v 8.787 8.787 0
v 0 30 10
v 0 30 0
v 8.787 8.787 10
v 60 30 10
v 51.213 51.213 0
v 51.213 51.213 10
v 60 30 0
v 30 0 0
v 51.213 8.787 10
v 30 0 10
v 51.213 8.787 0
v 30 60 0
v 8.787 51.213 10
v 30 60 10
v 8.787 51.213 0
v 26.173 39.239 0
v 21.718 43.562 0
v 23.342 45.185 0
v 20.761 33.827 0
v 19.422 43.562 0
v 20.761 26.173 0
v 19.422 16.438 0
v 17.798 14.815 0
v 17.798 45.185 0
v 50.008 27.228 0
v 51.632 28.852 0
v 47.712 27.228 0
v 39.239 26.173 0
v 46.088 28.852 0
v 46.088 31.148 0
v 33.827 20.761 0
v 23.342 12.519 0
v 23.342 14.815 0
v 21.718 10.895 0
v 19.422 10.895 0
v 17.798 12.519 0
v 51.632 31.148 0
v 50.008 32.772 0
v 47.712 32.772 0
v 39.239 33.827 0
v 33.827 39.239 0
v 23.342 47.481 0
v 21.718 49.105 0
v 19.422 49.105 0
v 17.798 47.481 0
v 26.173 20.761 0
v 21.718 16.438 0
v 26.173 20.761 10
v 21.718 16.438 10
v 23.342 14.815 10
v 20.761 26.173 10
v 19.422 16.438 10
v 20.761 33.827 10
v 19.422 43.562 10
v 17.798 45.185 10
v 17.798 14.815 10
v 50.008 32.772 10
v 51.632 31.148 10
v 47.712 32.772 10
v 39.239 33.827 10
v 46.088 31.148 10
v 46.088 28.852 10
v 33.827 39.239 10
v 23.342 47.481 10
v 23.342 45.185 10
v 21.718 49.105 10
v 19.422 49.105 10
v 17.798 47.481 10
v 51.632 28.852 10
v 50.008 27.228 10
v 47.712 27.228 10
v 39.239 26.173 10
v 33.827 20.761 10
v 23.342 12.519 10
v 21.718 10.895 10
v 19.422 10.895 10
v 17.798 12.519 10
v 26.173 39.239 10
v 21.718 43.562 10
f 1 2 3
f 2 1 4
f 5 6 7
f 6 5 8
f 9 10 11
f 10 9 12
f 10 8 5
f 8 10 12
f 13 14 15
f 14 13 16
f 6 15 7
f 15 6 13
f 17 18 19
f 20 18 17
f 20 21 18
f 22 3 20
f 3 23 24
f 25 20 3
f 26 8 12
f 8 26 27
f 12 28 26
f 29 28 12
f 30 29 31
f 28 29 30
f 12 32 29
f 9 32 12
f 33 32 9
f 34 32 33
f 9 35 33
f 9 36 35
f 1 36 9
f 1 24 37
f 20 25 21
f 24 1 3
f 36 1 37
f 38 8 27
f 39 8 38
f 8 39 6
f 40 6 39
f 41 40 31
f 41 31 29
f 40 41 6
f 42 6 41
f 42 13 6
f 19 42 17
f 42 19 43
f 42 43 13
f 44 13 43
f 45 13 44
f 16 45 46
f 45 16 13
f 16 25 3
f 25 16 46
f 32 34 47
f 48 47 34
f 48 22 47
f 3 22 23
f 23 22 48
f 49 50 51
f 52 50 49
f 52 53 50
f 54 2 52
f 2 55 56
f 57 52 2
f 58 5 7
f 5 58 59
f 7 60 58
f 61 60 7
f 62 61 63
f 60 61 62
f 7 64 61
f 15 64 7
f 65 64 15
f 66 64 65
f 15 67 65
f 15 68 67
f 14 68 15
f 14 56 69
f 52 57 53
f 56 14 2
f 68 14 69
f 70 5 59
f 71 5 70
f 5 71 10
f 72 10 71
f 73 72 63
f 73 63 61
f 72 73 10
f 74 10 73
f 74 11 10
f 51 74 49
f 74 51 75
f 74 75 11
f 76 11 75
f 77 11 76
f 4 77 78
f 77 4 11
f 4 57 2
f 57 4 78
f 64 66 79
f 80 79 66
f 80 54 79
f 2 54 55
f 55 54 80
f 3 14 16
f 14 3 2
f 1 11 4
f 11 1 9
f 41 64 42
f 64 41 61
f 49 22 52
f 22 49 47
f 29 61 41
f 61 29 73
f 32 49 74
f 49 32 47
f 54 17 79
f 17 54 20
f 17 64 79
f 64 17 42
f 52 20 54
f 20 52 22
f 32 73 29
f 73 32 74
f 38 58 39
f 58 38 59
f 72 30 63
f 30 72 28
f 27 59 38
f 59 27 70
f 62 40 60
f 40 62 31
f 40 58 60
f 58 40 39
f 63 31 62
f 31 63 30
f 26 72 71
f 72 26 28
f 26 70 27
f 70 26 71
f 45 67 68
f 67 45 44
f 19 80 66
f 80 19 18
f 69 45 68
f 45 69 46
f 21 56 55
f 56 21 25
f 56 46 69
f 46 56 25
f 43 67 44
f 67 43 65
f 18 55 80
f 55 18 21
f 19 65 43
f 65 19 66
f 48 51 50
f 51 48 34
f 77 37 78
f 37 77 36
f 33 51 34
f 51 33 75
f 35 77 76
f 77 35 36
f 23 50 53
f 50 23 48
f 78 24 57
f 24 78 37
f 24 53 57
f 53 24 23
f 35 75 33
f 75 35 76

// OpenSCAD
$fn = 32;

// ----------------------------------------------------------------------
// Polygon plate: 8-gon R30, 3 bolt windows
// ----------------------------------------------------------------------

// --- parameters (mm) ---
sides = 8;                // number of polygon sides
plate_r = 30;             // circumscribed radius of the polygon
bore_r = 10;              // centre bore radius
bolts = 3;                // number of bolt windows
ring_r = 18.86;           // bolt-circle radius
bolt_r = 3;               // bolt window radius
plate_t = 10;             // plate thickness, Z (extrusion height)

plate_d = 2 * plate_r;  // circumscribed diameter
bore_d = 2 * bore_r;  // centre bore diameter
bolt_d = 2 * bolt_r;  // bolt window diameter
ring_d = 2 * ring_r;  // bolt-circle diameter

profile = [[60, 30], [51.213, 51.213], [30, 60], [8.787, 51.213], [0, 30], [8.787, 8.787], [30, 0], [51.213, 8.787]];  // primary outline, 8 points, counter clockwise
void_1 = [[39.239, 33.827], [33.827, 39.239], [26.173, 39.239], [20.761, 33.827], [20.761, 26.173], [26.173, 20.761], [33.827, 20.761], [39.239, 26.173]];  // centre bore, 8 points
void_2 = [[51.632, 31.148], [50.008, 32.772], [47.712, 32.772], [46.088, 31.148], [46.088, 28.852], [47.712, 27.228], [50.008, 27.228], [51.632, 28.852]];  // bolt window 1, 8 points
void_3 = [[23.342, 47.481], [21.718, 49.105], [19.422, 49.105], [17.798, 47.481], [17.798, 45.185], [19.422, 43.562], [21.718, 43.562], [23.342, 45.185]];  // bolt window 2, 8 points
void_4 = [[23.342, 14.815], [21.718, 16.438], [19.422, 16.438], [17.798, 14.815], [17.798, 12.519], [19.422, 10.895], [21.718, 10.895], [23.342, 12.519]];  // bolt window 3, 8 points

// --- the one profile operation ---
difference() {
  linear_extrude(height = plate_t) polygon(points = profile);
  translate([0, 0, -1])
    linear_extrude(height = plate_t + 2) polygon(points = void_1);
  translate([0, 0, -1])
    linear_extrude(height = plate_t + 2) polygon(points = void_2);
  translate([0, 0, -1])
    linear_extrude(height = plate_t + 2) polygon(points = void_3);
  translate([0, 0, -1])
    linear_extrude(height = plate_t + 2) polygon(points = void_4);
}
